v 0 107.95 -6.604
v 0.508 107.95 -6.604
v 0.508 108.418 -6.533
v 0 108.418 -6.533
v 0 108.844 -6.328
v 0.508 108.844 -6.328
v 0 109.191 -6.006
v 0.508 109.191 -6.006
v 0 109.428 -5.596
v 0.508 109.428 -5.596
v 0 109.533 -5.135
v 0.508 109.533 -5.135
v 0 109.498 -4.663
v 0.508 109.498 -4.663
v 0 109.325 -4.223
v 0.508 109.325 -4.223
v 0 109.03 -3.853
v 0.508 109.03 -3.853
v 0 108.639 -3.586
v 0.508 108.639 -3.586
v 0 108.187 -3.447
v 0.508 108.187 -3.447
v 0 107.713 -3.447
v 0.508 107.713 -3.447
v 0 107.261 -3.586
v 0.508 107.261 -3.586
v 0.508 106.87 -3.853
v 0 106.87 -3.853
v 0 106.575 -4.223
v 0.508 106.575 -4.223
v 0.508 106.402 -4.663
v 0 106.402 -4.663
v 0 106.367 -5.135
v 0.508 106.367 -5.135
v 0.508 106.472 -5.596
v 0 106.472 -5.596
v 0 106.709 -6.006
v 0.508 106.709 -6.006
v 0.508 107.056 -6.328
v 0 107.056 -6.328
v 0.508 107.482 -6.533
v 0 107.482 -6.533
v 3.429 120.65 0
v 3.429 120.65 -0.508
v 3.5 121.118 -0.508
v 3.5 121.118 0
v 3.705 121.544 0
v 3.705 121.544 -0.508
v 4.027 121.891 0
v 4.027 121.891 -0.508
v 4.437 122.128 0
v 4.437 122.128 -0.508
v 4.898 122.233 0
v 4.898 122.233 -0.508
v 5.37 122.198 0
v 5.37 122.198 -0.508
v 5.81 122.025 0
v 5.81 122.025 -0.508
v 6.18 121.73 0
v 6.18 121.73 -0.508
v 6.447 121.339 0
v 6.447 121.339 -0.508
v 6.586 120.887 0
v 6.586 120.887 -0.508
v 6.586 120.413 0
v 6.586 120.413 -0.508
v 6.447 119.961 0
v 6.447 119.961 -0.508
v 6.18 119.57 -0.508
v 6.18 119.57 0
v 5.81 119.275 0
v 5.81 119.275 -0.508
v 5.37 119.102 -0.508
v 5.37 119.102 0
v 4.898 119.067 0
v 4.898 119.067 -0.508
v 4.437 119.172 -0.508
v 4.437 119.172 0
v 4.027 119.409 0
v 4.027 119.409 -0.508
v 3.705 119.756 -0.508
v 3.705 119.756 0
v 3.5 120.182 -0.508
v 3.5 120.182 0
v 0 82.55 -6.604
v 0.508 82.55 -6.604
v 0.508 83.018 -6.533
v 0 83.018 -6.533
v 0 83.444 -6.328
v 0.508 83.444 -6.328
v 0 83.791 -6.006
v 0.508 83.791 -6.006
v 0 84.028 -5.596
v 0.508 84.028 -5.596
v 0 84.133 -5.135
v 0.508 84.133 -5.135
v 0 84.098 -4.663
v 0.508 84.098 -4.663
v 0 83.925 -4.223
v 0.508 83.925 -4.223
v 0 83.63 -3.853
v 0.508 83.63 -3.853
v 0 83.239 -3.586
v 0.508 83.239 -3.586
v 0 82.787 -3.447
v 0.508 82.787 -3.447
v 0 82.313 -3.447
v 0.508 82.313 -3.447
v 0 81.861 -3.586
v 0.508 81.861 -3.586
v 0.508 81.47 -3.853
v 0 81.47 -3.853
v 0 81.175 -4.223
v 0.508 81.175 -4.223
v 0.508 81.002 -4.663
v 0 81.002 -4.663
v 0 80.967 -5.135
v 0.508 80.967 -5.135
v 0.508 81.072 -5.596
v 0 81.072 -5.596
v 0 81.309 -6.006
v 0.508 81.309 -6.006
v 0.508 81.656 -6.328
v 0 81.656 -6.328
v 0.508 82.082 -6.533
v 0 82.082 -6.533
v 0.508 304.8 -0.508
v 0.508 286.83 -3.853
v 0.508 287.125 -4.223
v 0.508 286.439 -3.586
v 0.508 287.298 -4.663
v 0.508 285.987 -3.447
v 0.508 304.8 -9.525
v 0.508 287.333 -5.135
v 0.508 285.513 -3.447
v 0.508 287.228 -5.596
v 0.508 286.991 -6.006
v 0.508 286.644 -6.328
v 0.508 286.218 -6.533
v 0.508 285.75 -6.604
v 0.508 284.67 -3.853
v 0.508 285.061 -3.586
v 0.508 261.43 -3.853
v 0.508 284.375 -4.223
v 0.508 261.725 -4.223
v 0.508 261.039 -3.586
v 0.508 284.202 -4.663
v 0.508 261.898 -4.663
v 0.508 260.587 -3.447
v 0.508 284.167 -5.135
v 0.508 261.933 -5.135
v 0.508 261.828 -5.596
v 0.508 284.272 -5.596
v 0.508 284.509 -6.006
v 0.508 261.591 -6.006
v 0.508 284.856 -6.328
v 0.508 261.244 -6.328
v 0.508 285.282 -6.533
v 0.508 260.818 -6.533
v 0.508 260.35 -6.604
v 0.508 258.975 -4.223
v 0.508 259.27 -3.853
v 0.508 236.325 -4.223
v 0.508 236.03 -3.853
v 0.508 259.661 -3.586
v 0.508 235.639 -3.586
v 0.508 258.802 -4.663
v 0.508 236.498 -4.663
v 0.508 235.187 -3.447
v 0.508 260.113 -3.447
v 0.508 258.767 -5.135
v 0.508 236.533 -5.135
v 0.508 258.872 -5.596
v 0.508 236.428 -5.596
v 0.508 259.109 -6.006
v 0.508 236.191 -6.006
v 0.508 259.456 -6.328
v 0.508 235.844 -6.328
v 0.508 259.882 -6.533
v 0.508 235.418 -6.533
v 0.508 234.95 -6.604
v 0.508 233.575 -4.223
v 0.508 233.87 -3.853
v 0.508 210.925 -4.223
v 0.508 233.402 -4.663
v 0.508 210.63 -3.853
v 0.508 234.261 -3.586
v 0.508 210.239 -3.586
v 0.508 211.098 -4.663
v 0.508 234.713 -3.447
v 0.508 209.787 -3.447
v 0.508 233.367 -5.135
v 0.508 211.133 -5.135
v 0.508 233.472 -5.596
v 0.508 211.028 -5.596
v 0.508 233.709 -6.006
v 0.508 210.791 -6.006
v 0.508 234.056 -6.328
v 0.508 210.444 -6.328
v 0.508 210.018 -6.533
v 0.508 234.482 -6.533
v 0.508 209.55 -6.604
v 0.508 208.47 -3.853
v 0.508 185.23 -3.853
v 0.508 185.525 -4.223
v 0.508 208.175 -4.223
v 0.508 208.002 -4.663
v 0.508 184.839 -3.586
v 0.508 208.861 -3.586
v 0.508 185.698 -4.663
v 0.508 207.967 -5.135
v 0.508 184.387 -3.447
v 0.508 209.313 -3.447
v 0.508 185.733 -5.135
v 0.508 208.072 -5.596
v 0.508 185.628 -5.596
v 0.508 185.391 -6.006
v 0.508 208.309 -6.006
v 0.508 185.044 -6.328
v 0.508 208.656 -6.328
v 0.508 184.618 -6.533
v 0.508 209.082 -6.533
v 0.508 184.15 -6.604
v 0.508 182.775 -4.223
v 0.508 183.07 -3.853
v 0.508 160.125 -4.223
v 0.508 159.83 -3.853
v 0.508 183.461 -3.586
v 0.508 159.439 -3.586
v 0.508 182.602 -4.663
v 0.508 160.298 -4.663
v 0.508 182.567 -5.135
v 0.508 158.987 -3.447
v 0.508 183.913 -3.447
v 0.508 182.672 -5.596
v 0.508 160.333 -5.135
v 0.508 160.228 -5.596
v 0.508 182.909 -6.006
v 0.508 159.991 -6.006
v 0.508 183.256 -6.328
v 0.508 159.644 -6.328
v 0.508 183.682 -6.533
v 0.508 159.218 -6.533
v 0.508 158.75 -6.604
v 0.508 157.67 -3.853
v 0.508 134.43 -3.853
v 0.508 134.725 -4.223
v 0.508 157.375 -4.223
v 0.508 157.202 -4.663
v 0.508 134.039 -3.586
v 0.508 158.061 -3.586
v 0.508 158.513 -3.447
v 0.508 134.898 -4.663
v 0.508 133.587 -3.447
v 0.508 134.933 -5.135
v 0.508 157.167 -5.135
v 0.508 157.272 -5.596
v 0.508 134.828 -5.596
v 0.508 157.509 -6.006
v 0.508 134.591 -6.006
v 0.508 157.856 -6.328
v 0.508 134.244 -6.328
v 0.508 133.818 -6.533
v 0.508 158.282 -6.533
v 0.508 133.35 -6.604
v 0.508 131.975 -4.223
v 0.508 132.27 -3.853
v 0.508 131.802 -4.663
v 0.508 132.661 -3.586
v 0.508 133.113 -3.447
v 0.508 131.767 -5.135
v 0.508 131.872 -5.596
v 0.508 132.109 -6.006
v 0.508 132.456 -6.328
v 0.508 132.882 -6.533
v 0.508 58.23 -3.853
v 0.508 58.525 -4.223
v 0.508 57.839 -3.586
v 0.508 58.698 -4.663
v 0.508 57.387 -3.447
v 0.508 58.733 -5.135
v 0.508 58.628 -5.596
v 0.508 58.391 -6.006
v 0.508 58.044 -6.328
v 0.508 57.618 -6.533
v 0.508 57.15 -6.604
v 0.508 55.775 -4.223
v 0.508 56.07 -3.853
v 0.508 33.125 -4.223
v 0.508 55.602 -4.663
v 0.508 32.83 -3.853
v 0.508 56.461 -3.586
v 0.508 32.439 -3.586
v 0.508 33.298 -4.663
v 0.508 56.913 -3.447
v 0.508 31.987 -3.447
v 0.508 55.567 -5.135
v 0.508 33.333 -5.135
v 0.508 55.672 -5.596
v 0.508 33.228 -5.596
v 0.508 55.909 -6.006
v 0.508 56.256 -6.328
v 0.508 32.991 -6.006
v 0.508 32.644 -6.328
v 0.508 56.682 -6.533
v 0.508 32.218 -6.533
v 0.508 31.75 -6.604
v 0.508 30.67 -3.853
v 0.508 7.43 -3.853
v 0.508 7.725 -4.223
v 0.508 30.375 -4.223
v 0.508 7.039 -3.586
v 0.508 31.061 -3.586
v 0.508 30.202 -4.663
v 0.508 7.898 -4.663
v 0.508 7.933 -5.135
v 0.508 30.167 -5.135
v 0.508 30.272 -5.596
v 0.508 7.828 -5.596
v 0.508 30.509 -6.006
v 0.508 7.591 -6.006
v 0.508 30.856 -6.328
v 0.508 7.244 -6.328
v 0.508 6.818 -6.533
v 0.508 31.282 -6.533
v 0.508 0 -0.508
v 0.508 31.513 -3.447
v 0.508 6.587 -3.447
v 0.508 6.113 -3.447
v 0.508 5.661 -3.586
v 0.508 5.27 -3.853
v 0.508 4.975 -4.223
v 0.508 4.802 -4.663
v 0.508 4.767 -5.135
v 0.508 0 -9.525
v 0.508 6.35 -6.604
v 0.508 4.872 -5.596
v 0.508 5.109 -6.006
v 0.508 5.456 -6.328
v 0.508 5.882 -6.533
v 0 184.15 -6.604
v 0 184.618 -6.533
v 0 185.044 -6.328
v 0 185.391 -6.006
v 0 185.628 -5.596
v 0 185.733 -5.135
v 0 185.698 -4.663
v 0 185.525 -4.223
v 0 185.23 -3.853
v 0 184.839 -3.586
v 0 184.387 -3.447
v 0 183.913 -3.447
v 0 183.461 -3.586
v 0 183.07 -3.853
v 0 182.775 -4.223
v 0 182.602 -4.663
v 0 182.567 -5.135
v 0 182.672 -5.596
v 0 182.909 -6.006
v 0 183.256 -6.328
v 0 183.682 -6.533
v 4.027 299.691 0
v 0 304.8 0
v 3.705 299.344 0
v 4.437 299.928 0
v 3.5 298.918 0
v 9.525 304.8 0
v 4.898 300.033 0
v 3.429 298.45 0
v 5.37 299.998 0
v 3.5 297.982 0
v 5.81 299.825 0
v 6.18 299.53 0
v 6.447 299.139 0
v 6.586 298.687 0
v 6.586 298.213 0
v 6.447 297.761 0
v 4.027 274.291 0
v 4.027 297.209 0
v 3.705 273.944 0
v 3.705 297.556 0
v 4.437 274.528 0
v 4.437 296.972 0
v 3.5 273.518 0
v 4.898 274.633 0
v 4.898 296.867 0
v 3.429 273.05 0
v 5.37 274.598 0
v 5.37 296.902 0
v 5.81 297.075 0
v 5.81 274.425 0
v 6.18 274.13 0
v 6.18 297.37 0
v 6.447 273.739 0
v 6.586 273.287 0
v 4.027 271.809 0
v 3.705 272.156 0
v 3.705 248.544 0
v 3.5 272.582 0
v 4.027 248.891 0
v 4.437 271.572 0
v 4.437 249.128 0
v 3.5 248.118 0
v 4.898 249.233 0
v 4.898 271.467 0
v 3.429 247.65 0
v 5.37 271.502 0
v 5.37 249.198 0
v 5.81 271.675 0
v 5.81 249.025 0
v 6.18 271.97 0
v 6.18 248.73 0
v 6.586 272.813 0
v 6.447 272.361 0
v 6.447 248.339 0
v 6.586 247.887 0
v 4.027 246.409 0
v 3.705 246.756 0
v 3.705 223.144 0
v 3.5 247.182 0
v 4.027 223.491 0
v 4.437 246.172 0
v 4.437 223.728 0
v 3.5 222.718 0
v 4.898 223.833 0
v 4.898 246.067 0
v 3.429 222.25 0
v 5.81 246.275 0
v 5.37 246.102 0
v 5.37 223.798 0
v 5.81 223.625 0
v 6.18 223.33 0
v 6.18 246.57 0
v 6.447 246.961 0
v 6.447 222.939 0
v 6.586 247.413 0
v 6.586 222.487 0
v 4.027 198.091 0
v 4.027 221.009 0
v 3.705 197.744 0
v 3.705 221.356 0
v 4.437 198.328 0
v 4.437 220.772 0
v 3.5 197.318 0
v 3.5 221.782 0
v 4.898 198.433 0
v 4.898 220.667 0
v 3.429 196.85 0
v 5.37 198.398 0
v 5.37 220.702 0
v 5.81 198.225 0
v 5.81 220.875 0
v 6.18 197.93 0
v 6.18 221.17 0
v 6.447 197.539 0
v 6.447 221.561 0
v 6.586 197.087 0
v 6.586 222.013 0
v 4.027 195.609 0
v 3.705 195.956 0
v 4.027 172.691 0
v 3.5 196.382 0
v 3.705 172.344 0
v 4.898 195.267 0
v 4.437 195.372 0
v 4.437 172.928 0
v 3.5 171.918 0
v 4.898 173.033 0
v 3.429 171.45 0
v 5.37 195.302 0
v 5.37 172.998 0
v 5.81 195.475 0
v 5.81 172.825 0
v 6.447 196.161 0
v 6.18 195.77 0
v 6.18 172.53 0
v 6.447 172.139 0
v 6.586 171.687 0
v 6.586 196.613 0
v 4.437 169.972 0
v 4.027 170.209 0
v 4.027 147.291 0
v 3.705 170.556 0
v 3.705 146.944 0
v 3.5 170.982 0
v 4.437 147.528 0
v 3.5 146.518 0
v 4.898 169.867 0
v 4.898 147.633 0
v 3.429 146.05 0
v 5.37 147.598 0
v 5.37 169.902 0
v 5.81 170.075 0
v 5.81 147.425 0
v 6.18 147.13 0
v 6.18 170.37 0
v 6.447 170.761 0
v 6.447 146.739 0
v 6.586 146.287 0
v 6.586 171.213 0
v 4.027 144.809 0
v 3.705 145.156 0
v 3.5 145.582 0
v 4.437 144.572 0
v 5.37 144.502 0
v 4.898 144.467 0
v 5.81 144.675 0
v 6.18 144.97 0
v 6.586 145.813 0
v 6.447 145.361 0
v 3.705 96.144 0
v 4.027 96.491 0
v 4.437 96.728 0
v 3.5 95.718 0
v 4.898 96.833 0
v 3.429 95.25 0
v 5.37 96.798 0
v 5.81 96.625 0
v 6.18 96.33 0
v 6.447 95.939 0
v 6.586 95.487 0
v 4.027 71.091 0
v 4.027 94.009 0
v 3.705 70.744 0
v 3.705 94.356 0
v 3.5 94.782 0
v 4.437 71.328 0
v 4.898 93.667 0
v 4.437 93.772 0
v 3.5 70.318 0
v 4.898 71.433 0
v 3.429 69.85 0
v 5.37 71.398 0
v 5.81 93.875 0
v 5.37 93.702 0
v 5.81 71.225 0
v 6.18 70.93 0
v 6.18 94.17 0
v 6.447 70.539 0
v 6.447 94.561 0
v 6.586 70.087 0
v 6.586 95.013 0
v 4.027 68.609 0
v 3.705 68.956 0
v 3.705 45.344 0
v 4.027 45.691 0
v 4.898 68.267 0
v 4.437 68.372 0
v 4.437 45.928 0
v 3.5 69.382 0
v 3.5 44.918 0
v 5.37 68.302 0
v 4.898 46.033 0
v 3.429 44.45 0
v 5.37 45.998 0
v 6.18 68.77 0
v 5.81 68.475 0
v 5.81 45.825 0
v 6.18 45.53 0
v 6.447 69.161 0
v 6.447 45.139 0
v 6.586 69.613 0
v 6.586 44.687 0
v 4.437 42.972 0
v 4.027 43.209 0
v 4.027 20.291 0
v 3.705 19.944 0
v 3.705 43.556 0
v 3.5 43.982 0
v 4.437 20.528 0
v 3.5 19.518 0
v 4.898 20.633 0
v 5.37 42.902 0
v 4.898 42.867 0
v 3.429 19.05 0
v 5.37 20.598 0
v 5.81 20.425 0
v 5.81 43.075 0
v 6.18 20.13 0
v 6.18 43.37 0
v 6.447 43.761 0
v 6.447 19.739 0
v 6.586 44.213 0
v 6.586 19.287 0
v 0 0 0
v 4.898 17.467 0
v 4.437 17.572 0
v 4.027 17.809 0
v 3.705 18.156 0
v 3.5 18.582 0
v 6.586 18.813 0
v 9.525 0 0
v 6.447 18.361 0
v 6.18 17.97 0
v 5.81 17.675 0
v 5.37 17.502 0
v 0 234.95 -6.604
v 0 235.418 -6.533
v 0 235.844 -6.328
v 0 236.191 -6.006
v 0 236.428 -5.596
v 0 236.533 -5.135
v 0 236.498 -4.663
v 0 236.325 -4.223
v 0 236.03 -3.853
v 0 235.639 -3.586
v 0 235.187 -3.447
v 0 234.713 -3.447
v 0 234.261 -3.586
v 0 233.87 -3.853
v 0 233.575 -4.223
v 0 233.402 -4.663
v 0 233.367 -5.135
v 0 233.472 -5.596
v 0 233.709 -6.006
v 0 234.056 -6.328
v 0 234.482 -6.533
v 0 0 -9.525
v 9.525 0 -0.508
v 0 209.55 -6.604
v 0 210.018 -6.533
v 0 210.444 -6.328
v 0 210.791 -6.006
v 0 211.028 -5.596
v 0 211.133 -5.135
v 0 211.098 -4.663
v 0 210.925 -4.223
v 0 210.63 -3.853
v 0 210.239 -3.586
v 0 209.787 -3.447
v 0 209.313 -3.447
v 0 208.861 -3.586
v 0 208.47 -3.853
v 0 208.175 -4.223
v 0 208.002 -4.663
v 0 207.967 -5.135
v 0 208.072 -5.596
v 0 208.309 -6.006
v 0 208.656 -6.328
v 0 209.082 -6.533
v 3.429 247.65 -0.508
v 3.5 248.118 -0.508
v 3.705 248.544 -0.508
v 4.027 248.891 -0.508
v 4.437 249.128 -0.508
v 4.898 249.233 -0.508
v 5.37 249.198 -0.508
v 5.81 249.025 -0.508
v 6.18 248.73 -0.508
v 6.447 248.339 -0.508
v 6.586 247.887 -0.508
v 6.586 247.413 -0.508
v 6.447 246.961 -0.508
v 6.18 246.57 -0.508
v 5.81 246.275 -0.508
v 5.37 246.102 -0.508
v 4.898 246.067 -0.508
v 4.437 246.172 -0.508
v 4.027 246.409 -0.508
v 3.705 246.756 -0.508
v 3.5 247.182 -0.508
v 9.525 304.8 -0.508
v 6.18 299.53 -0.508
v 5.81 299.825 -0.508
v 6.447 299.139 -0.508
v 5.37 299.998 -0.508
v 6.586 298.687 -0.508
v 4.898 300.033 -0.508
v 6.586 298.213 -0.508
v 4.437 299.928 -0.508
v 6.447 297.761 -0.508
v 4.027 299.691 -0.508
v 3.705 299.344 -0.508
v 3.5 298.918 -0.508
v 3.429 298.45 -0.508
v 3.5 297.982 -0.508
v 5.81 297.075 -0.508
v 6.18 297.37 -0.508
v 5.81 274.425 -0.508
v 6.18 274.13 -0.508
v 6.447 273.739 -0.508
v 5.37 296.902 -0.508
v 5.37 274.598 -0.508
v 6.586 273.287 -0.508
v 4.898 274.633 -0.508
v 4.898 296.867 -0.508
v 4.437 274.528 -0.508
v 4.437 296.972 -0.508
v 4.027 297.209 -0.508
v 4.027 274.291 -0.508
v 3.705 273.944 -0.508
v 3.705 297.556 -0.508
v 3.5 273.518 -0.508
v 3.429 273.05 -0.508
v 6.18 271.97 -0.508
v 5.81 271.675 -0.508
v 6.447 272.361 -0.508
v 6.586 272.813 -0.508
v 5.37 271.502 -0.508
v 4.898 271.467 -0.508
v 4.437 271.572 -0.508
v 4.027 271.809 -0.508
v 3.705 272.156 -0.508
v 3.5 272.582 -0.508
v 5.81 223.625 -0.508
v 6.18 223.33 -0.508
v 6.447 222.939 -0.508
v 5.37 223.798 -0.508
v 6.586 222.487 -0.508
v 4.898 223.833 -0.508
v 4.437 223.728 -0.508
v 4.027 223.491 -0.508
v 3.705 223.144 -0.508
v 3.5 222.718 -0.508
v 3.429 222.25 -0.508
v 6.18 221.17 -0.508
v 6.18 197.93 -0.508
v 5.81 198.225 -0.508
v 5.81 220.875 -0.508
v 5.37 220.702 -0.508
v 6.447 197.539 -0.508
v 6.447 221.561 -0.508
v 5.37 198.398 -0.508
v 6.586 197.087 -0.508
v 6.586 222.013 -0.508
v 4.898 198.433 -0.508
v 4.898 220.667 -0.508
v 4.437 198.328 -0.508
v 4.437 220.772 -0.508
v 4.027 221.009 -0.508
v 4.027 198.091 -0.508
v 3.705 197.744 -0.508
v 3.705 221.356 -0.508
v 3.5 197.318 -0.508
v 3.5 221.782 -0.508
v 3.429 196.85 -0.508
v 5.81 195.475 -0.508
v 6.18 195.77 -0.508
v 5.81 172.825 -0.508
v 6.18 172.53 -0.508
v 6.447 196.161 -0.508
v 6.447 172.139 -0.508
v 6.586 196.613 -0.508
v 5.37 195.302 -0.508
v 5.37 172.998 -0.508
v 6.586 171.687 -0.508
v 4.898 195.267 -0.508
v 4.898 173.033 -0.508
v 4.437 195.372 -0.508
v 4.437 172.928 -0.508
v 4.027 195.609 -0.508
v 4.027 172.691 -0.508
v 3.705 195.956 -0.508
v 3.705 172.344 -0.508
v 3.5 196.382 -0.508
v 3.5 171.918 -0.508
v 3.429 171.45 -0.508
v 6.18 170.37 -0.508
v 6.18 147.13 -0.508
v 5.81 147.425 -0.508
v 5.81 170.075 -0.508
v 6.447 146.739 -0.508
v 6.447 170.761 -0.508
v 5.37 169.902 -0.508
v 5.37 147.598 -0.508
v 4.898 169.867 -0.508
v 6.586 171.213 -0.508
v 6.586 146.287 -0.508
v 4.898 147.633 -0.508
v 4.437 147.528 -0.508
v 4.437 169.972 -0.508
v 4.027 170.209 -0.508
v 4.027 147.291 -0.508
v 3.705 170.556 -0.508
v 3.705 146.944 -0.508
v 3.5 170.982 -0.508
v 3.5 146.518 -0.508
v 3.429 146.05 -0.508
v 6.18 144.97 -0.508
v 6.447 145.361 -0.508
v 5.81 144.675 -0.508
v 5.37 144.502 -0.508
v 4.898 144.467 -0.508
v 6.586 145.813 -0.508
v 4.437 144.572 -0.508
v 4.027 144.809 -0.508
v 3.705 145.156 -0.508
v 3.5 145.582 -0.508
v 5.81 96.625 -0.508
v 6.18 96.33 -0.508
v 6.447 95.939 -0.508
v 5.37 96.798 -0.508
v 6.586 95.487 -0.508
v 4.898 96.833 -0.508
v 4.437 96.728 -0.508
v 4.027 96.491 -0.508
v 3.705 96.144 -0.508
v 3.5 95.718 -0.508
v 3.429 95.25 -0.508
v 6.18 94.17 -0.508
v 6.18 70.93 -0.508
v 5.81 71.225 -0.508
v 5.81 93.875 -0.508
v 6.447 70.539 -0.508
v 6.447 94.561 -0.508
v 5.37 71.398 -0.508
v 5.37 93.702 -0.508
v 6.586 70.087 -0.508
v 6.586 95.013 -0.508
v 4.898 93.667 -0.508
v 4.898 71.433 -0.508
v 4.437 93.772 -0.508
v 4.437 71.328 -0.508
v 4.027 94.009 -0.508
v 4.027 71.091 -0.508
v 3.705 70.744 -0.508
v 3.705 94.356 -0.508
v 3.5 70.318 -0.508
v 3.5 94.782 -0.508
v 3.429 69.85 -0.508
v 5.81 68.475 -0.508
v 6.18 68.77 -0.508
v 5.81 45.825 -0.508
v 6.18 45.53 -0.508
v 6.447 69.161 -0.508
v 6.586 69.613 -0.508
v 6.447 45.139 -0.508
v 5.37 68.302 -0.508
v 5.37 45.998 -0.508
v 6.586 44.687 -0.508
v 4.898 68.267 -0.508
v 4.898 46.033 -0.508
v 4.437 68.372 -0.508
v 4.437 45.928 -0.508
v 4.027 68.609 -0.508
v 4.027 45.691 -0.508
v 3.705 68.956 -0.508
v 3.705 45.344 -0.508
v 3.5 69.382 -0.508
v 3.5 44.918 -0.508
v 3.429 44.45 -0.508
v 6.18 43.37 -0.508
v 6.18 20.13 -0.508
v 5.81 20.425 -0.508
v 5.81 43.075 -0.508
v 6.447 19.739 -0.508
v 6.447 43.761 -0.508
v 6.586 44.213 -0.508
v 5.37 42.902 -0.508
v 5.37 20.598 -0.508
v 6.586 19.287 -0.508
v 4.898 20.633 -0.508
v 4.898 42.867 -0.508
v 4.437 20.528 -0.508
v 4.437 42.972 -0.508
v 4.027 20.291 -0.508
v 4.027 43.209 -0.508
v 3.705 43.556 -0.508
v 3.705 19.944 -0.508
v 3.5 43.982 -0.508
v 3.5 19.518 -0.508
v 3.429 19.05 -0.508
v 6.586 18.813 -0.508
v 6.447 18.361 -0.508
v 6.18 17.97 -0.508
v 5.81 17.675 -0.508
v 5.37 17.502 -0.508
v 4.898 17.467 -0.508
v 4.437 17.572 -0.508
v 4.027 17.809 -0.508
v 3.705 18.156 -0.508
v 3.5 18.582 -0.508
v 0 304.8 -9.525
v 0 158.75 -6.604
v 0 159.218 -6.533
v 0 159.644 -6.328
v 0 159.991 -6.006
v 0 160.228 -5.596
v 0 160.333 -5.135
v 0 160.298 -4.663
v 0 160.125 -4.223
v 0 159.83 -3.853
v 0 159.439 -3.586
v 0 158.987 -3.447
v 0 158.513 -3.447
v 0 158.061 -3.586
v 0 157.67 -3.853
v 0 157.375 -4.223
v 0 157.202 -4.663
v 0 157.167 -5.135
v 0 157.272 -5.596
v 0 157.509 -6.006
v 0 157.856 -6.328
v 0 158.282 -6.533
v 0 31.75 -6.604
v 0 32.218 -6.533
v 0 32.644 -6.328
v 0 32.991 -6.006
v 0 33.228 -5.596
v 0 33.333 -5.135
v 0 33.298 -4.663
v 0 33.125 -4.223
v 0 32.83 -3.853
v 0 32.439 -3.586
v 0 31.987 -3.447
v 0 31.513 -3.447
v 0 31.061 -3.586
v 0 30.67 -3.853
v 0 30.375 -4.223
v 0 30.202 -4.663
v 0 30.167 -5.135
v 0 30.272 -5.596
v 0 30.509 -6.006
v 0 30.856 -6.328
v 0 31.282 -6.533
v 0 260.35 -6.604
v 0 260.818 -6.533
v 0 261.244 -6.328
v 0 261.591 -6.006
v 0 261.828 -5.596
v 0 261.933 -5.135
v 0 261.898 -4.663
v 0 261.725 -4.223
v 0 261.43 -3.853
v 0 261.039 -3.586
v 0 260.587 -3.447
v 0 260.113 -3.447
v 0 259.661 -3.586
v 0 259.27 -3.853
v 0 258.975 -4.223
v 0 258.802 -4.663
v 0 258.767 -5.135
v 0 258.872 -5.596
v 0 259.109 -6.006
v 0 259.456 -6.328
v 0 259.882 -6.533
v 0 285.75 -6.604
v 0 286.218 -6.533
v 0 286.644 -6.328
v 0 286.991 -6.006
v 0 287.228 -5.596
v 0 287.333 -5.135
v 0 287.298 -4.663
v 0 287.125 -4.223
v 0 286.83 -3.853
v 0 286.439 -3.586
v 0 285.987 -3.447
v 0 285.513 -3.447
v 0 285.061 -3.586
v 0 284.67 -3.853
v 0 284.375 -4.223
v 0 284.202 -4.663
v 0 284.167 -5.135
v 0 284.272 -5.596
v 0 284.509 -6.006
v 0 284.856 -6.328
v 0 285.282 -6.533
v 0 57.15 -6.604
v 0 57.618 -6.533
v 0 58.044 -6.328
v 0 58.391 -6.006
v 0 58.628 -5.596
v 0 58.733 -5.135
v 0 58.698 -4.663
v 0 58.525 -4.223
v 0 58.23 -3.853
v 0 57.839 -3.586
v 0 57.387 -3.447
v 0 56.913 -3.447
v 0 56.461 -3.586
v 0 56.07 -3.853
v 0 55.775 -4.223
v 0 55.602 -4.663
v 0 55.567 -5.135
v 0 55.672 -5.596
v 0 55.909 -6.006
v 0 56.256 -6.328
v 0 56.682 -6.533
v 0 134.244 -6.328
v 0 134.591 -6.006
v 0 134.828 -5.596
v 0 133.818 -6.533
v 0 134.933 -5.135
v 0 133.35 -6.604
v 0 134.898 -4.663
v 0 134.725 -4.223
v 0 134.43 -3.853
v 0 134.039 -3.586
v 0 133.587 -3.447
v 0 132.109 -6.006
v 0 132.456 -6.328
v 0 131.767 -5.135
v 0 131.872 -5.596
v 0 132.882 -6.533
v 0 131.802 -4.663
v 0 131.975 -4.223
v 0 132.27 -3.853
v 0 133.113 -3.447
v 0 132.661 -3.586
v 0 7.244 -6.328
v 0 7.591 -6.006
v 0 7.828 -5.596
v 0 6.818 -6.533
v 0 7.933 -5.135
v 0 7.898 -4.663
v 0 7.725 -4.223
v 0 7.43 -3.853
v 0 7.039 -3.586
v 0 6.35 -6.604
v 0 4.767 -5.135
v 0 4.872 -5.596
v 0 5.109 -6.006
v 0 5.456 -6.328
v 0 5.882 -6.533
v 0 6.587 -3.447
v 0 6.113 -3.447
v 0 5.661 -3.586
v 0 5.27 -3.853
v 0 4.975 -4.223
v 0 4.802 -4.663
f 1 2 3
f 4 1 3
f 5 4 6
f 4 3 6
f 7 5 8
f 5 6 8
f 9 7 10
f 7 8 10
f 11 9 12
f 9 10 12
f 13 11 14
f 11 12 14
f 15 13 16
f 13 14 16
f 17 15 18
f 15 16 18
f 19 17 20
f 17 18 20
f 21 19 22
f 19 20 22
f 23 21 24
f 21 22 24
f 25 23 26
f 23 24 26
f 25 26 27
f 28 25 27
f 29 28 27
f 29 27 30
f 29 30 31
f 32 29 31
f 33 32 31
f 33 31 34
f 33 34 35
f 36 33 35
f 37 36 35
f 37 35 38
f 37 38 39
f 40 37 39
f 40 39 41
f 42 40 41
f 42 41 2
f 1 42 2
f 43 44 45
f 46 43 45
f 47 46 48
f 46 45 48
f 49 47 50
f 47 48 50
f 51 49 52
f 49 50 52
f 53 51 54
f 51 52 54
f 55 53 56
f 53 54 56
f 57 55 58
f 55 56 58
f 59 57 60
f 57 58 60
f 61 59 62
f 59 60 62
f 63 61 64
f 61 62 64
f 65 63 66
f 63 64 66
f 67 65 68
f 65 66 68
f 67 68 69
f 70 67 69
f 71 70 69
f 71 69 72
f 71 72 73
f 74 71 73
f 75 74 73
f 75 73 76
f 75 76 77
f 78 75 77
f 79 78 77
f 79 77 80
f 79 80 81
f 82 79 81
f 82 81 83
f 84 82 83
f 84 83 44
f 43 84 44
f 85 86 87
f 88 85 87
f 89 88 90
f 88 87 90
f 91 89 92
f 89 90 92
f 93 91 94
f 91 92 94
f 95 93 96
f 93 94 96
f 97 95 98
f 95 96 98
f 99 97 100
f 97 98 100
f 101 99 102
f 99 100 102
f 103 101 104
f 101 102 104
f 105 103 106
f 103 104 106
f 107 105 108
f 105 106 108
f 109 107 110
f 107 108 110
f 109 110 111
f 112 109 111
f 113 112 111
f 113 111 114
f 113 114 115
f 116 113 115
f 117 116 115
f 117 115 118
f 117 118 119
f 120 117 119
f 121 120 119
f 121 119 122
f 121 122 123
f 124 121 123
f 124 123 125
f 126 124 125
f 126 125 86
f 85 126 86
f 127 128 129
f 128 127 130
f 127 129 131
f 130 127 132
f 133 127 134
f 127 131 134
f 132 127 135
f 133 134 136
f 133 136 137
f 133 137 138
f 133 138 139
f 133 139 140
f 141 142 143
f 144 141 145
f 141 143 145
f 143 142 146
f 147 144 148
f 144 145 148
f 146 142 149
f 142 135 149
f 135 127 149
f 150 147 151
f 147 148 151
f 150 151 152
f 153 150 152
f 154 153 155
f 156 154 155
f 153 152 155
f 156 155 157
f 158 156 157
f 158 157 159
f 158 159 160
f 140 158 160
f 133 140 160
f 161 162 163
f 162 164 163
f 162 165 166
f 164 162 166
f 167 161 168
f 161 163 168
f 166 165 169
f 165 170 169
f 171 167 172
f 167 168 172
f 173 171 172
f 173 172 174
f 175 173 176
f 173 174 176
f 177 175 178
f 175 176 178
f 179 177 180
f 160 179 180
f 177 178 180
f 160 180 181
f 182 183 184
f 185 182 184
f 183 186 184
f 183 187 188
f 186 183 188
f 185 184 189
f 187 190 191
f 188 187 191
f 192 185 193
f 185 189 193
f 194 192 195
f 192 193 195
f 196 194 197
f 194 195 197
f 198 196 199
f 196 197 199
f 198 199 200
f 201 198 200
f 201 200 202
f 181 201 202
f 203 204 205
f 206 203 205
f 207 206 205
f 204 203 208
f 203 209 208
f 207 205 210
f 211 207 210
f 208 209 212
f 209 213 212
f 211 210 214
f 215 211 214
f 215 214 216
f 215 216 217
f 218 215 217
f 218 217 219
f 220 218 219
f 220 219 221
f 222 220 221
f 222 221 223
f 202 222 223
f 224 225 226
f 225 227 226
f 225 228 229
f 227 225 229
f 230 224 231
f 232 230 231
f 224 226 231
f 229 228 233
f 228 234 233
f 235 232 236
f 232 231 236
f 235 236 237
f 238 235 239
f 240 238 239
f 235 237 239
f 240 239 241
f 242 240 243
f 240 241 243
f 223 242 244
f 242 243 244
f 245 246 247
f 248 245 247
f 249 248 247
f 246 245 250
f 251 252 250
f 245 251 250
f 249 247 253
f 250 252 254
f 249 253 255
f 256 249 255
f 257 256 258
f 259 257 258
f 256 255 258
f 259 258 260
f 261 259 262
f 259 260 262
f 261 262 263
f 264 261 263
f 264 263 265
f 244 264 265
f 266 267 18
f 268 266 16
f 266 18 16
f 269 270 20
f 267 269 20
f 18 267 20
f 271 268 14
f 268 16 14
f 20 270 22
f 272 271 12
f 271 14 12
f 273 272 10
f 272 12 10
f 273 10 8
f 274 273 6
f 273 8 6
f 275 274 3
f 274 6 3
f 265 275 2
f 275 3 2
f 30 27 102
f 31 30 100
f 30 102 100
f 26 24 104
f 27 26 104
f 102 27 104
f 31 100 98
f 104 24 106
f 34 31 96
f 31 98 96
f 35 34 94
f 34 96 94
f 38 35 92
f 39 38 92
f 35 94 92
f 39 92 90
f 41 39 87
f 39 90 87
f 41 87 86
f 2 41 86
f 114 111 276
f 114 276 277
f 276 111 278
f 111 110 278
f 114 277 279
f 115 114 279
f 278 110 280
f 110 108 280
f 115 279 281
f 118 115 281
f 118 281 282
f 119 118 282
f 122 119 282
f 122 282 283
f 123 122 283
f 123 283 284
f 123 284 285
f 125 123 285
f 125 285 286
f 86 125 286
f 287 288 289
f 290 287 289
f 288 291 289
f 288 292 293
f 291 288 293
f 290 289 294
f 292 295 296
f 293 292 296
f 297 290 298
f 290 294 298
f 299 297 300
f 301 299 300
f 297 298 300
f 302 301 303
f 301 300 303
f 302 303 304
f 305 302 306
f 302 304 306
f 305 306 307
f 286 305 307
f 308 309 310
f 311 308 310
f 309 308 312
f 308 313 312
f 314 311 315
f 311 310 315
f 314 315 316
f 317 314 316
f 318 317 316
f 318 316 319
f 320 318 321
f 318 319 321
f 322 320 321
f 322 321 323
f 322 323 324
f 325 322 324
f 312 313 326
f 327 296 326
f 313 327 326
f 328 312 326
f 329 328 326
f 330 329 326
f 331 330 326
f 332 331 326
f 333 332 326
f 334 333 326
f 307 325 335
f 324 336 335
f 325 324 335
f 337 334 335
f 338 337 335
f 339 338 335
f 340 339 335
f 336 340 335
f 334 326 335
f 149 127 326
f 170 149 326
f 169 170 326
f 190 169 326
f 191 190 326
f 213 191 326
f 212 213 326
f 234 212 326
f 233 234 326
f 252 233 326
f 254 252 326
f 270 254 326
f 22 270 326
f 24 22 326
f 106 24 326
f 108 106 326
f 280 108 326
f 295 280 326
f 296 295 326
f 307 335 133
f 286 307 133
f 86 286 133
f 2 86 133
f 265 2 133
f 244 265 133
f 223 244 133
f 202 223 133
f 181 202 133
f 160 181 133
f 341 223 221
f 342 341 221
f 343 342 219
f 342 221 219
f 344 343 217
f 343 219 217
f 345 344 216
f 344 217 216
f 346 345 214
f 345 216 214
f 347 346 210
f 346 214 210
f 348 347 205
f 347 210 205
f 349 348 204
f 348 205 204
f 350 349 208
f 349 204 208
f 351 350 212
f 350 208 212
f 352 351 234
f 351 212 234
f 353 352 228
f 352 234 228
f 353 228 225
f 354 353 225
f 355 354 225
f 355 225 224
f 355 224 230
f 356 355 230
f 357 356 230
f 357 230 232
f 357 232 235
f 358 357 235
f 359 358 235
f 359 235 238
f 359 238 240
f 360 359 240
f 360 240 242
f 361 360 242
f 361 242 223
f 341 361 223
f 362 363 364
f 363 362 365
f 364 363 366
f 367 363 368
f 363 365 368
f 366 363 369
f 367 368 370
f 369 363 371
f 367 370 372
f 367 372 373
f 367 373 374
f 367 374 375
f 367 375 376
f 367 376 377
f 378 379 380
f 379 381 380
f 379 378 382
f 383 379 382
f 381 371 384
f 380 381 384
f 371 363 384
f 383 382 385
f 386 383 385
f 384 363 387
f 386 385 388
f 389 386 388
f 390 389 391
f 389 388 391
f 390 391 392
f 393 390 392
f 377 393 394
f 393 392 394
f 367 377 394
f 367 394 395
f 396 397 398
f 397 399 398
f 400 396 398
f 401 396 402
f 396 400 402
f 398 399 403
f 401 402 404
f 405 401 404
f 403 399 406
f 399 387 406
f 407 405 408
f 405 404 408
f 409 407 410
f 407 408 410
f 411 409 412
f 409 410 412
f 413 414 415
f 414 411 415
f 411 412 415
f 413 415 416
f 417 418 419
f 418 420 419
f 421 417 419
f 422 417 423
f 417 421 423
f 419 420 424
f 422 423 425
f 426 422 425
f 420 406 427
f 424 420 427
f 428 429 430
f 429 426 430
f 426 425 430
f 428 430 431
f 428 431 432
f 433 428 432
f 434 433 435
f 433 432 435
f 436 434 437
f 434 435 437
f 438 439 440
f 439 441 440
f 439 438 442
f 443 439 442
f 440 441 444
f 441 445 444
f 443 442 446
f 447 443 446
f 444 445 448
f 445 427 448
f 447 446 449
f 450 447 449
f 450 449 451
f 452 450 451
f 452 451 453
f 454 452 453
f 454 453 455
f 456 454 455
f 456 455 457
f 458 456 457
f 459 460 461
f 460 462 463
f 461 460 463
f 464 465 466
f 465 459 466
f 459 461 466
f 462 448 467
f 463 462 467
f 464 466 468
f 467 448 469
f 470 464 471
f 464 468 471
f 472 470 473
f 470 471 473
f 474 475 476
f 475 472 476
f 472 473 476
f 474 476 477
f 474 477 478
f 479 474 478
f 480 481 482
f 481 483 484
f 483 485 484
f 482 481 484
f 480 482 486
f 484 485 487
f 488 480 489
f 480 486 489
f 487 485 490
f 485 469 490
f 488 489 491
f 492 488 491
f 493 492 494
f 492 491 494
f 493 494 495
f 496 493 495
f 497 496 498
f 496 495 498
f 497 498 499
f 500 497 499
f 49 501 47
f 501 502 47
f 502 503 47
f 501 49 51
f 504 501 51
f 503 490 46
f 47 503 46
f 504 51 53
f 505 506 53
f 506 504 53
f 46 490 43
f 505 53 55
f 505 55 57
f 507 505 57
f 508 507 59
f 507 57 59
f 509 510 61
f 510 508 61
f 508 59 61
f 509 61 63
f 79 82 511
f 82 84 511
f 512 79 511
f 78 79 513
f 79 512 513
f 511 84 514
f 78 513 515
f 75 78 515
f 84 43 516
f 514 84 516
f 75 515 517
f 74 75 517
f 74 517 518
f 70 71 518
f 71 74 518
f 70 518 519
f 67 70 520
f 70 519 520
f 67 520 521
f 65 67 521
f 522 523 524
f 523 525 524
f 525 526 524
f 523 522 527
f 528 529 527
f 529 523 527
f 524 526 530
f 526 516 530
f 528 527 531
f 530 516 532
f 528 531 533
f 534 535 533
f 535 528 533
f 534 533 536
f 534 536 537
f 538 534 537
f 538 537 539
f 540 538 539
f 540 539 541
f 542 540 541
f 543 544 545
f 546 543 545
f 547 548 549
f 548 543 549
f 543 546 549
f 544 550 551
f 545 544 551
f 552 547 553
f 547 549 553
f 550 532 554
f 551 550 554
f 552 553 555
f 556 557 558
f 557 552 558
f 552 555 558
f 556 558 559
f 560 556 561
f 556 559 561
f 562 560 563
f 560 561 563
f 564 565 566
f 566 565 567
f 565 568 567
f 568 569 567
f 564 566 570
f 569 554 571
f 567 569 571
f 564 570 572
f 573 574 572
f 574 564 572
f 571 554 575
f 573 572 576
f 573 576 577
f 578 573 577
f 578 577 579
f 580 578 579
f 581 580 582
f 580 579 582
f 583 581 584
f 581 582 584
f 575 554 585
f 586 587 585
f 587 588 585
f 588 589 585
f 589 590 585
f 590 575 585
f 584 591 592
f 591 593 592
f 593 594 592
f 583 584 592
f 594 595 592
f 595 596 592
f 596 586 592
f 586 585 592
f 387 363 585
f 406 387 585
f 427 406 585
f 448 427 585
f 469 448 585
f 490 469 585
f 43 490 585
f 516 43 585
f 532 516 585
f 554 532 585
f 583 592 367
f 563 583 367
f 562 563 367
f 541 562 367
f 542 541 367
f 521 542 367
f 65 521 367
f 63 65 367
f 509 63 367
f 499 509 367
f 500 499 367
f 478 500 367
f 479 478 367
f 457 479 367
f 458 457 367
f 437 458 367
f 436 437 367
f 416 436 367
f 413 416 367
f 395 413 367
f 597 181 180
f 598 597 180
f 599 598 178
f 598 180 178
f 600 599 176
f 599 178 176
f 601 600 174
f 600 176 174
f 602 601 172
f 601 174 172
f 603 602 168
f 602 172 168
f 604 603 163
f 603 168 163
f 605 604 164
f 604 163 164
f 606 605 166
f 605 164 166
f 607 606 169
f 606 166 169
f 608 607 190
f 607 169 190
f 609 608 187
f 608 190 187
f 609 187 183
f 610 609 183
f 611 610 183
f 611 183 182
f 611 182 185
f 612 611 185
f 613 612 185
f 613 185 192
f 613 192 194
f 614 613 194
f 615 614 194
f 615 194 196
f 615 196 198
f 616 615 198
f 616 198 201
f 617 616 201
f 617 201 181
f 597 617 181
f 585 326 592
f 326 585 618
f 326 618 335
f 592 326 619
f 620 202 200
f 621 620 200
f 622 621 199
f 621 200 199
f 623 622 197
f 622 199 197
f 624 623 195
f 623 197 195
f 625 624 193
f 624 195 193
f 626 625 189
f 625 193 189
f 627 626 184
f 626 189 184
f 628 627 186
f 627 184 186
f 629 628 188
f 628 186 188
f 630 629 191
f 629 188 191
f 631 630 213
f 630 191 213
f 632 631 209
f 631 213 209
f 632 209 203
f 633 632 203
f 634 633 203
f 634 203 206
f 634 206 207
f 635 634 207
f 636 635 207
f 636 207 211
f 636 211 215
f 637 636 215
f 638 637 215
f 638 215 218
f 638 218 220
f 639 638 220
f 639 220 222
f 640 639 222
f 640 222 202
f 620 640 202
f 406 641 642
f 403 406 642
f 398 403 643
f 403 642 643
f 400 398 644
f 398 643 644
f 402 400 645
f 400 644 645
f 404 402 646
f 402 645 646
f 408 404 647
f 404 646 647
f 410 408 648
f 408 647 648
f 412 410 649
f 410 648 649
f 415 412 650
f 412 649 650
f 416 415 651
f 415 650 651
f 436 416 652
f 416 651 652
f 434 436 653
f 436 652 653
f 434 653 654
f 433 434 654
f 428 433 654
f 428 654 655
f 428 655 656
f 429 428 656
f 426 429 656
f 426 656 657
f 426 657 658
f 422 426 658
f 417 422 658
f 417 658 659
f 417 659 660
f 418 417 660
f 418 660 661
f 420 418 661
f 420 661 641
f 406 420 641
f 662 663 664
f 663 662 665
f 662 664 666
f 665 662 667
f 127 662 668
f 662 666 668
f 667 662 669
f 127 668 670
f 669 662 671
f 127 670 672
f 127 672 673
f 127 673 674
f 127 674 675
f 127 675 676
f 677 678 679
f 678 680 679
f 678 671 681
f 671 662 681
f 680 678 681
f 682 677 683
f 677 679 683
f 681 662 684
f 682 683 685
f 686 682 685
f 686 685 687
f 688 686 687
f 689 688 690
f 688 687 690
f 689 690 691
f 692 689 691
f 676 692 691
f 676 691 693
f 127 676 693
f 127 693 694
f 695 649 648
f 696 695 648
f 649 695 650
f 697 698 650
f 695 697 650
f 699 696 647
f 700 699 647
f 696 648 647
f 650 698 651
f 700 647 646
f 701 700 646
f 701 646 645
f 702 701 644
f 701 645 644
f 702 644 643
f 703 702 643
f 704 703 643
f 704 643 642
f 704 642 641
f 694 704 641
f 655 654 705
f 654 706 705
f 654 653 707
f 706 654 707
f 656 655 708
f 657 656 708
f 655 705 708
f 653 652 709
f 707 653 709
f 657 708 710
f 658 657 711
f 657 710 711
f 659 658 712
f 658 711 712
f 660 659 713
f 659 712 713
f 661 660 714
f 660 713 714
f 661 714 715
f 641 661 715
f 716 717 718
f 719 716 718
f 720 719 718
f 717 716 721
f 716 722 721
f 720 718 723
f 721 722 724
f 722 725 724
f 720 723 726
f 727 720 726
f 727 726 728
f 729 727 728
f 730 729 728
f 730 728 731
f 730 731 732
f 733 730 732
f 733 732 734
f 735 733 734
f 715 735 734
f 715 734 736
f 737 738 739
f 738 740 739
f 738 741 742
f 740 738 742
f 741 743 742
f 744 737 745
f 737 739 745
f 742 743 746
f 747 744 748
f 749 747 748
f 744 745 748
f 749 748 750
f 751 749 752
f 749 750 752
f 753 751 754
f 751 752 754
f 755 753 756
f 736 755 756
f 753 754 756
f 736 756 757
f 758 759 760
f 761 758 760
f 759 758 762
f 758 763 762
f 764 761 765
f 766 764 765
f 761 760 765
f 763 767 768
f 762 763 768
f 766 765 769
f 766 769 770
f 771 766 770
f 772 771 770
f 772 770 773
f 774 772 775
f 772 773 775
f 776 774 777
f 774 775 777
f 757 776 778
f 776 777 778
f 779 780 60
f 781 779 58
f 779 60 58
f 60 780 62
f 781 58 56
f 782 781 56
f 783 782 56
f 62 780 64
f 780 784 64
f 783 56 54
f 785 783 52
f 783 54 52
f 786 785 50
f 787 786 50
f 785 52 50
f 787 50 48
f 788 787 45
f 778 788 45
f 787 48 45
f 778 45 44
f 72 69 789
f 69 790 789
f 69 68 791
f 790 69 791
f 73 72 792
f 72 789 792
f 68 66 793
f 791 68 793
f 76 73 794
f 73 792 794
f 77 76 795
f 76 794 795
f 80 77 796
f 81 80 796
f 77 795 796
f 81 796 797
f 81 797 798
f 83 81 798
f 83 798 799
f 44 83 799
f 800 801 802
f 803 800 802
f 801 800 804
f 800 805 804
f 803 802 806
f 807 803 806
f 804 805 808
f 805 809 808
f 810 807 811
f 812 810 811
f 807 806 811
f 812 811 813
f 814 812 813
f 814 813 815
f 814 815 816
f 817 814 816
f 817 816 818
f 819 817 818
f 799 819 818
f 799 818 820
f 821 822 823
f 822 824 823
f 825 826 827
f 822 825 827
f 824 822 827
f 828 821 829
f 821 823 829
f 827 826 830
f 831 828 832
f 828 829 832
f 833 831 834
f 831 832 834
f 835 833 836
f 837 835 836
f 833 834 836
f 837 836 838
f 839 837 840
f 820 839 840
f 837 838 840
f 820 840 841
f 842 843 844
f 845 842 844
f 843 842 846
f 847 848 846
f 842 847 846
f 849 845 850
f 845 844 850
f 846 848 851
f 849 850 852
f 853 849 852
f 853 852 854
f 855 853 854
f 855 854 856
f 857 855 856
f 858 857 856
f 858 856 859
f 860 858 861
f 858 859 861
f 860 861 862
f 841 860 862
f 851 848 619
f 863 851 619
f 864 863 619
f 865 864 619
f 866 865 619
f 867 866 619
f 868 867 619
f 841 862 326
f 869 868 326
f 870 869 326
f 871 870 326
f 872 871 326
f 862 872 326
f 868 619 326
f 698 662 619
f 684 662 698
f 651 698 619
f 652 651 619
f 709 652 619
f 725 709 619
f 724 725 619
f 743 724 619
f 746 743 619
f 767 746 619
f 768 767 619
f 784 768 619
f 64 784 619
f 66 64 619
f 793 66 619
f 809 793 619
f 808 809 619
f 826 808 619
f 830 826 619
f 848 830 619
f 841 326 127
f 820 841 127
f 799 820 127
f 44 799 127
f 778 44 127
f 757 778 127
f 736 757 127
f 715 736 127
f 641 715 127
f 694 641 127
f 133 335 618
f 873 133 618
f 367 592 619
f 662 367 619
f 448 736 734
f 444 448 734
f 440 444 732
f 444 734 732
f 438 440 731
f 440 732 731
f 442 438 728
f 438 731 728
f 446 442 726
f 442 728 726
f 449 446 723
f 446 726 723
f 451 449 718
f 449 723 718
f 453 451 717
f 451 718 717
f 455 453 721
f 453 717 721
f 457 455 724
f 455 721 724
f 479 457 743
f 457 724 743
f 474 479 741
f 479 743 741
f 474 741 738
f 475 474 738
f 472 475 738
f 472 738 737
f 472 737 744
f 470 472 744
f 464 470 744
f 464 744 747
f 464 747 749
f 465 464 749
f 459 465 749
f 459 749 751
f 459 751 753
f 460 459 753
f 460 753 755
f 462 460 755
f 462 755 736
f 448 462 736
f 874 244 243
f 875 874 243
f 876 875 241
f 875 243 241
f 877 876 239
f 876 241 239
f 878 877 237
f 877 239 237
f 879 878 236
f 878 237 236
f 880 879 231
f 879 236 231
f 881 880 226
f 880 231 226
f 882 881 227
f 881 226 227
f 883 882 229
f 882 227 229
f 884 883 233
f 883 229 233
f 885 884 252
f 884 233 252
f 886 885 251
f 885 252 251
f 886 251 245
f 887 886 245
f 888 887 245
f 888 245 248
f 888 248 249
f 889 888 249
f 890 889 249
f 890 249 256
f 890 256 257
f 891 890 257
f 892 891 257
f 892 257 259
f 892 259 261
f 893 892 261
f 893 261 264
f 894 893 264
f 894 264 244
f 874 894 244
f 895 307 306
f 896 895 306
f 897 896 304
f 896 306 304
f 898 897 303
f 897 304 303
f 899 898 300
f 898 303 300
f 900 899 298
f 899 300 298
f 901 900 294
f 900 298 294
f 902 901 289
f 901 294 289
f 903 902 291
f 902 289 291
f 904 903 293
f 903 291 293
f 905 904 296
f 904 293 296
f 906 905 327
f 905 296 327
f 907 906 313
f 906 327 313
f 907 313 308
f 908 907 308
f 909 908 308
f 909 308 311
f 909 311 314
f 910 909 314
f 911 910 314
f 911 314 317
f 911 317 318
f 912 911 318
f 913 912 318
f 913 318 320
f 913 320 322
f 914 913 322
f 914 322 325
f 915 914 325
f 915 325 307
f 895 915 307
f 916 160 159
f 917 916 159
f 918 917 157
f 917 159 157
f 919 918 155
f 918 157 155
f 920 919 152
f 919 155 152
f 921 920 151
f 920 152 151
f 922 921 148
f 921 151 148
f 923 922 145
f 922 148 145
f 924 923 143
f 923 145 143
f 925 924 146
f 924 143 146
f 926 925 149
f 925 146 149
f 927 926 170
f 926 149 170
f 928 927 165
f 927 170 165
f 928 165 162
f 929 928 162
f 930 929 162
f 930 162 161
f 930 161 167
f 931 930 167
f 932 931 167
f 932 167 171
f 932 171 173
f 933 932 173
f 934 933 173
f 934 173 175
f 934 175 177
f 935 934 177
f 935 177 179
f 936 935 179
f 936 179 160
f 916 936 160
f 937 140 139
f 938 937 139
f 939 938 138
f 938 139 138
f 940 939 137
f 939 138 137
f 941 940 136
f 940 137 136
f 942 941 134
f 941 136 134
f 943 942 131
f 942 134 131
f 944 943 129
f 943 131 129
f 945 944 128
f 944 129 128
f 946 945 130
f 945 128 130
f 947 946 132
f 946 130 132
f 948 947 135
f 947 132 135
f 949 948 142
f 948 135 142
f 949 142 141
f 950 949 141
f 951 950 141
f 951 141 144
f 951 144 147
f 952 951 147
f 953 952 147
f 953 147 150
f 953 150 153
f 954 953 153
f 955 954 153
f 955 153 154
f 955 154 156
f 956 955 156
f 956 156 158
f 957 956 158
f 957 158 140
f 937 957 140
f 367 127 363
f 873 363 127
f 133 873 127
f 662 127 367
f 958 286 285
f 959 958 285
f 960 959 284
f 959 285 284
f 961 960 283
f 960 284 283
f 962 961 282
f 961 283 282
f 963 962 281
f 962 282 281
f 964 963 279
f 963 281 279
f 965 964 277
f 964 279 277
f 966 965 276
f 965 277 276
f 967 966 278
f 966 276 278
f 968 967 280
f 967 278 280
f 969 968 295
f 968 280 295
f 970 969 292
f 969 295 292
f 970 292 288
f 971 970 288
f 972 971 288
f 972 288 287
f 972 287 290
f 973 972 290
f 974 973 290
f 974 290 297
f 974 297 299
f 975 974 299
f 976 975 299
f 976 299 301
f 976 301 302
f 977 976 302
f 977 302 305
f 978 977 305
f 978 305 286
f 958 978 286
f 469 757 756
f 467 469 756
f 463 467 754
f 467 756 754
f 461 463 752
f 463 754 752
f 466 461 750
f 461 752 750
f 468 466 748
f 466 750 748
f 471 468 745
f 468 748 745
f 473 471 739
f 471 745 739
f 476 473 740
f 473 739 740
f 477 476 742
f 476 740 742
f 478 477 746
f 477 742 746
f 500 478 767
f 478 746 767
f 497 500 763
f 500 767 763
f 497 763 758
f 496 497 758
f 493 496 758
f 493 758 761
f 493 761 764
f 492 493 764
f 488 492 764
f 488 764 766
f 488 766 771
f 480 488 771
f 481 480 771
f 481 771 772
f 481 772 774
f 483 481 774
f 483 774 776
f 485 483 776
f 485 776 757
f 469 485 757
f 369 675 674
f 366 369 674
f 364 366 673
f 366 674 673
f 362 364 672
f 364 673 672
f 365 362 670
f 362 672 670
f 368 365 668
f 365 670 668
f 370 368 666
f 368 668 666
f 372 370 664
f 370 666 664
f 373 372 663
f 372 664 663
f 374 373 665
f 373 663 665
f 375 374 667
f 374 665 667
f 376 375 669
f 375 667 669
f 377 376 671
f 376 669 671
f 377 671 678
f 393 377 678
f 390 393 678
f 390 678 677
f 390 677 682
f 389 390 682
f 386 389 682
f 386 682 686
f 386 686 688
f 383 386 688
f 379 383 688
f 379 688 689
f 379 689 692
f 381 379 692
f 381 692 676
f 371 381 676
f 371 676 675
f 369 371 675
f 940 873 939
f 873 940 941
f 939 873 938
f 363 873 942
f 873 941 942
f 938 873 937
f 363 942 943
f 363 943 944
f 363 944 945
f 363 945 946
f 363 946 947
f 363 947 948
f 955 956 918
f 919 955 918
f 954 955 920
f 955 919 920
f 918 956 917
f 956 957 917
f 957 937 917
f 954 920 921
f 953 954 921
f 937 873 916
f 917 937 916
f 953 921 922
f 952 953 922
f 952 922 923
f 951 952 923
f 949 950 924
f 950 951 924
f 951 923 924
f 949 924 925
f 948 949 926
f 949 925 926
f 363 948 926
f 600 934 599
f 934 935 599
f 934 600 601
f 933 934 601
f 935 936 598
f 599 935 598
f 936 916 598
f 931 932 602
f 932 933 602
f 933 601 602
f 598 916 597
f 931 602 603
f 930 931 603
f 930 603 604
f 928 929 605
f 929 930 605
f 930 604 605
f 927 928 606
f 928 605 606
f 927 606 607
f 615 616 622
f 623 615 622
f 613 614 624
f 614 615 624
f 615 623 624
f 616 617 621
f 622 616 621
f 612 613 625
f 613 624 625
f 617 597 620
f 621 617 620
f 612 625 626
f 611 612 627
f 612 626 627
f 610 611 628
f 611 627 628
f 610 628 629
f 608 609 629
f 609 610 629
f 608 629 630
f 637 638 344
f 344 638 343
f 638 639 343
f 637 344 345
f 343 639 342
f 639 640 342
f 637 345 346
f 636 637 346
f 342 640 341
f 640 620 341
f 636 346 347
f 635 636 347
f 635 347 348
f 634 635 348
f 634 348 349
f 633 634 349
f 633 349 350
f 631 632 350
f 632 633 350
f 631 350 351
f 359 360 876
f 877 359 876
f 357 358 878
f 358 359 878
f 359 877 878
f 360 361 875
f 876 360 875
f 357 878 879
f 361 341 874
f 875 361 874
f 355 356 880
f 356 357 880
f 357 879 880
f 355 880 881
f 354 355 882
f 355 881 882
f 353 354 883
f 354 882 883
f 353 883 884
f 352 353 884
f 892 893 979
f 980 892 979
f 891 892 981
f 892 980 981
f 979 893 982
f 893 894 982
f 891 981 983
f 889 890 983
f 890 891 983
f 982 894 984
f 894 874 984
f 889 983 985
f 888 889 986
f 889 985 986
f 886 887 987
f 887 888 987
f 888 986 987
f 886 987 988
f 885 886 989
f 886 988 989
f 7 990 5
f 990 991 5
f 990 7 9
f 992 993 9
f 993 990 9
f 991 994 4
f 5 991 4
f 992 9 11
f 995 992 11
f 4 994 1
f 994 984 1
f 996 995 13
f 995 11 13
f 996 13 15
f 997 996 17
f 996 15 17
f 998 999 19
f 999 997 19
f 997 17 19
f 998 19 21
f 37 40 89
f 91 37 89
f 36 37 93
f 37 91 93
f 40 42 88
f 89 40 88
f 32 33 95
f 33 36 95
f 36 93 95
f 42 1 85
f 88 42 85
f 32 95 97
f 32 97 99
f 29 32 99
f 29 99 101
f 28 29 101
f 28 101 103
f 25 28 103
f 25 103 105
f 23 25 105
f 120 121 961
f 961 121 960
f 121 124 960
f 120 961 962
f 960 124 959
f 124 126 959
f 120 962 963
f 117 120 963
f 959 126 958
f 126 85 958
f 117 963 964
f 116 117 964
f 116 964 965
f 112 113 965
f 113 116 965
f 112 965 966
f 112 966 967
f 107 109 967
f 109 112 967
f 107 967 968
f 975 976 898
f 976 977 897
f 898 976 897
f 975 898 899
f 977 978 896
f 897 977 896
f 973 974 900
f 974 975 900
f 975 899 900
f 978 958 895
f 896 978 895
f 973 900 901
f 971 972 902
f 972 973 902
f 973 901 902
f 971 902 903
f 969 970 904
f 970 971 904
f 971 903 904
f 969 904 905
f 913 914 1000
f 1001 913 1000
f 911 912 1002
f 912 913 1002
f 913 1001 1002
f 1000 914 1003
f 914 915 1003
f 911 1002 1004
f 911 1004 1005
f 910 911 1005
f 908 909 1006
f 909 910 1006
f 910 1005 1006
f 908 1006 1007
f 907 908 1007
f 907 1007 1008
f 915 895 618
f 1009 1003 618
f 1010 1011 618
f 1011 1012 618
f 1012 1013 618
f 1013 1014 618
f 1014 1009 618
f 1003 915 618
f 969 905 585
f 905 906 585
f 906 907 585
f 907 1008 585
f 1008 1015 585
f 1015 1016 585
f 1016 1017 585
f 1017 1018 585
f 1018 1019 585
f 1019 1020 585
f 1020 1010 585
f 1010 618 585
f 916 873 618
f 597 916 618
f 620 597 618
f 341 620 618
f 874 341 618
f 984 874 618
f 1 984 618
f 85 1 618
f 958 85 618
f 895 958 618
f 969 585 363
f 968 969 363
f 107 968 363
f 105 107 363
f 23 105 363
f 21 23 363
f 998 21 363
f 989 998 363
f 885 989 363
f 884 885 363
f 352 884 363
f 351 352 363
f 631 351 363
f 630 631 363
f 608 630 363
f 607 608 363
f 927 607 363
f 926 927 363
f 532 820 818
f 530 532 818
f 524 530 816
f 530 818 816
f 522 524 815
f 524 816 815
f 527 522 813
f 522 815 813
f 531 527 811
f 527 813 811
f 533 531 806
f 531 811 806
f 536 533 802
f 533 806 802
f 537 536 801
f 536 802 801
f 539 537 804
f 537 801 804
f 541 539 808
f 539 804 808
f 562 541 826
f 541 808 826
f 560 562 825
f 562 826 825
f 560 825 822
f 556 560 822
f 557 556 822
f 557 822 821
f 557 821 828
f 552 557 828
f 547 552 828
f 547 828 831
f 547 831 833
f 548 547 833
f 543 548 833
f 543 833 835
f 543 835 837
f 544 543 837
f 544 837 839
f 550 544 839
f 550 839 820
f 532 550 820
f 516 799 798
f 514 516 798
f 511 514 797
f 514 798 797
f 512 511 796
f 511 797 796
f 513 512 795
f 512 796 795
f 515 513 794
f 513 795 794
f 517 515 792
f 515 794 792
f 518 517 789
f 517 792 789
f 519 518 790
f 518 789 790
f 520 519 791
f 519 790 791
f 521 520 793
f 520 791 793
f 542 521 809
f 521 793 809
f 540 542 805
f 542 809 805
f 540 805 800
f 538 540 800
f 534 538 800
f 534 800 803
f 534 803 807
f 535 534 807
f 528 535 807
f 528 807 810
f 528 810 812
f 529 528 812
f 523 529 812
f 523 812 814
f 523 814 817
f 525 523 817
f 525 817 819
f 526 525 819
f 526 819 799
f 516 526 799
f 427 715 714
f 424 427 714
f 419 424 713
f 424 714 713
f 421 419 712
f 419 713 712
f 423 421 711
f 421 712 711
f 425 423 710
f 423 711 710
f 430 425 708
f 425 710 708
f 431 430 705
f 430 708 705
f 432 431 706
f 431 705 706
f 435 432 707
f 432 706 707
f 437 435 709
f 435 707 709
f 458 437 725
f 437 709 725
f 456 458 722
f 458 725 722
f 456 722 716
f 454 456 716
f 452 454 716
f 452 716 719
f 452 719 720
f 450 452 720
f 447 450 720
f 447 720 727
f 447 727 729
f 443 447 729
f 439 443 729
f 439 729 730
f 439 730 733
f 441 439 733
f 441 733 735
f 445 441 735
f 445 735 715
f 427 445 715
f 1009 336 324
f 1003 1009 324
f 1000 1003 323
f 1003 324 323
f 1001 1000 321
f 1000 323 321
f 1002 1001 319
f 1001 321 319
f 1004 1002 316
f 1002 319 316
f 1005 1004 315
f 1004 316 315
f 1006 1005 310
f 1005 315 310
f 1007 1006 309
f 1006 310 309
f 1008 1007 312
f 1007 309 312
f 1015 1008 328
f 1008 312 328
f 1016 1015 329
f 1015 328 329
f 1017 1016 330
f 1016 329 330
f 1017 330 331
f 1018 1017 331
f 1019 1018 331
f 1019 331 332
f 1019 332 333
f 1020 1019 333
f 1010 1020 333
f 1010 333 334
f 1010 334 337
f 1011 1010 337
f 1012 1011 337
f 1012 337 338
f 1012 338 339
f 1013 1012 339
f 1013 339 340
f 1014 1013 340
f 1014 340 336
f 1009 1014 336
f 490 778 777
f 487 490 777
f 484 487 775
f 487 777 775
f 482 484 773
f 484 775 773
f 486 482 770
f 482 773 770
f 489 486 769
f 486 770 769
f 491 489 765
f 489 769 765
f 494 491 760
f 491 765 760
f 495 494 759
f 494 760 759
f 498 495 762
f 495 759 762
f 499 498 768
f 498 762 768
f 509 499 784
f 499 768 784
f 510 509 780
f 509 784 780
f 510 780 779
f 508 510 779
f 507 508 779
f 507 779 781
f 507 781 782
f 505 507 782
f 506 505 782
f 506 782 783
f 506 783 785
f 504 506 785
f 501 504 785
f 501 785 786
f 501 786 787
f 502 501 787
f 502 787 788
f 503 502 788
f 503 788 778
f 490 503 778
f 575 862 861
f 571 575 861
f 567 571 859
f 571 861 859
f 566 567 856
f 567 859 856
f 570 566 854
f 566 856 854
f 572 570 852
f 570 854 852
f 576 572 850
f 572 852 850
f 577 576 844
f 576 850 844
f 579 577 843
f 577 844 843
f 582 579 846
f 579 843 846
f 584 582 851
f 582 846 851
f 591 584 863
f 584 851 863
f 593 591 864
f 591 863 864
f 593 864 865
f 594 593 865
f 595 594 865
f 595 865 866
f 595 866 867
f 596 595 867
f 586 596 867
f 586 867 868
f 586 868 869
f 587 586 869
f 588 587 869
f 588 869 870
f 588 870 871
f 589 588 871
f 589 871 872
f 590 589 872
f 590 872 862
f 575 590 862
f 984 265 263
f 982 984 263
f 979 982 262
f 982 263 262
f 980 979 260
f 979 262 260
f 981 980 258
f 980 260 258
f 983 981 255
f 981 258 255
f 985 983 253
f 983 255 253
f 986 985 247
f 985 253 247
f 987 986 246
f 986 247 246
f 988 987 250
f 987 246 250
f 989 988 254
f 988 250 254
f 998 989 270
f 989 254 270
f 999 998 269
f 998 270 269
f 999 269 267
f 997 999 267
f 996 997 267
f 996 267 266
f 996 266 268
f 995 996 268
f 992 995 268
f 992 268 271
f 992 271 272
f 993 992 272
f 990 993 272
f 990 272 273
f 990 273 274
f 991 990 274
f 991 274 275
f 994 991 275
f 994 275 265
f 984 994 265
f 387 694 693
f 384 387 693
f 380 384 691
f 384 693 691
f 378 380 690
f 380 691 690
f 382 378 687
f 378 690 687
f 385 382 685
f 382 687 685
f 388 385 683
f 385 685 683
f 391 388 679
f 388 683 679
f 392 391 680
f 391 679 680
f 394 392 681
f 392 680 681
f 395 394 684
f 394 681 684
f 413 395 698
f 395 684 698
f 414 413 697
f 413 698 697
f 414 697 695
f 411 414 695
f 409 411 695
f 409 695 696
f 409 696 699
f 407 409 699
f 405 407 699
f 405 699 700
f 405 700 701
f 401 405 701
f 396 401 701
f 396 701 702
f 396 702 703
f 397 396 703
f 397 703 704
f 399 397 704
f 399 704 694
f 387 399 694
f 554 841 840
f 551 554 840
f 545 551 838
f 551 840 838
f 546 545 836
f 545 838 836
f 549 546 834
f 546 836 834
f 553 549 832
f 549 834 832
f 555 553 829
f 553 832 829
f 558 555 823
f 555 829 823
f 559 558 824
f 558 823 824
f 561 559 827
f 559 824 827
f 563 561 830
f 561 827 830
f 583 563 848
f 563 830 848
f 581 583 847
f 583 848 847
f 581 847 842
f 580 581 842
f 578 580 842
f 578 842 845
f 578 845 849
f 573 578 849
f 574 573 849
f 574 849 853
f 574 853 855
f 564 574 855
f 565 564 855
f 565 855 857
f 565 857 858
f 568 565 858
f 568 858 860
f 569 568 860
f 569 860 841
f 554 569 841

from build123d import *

# Parameters (mm, degrees)
BOSS_EXTRUDE1_DEPTH = 304.8
SKETCH3_R           = 1.5875
CUT_EXTRUDE1_DEPTH  = 306.082074062
LPATTERN1_COUNT     = 12
LPATTERN1_PITCH     = 25.4
SKETCH4_R           = 1.5875
CUT_EXTRUDE2_DEPTH  = 306.082074062
LPATTERN2_COUNT     = 12
LPATTERN2_PITCH     = 25.4


with BuildPart() as part:
    # Sketch2 → Boss-Extrude1 (new body)
    with BuildSketch(Plane(origin=(0, 0, 0), x_dir=(1, 0, 0), z_dir=(0, 1, 0))):
        Polygon((0, 0), (9.525, 0), (9.525, 0.508), (0.508, 0.508), (0.508, 9.525), (0, 9.525), align=None)
    extrude(amount=BOSS_EXTRUDE1_DEPTH)

    # Sketch3 → Cut-Extrude1 (cut, through all)
    with BuildSketch(Plane(origin=(0, 0, -0.508), x_dir=(-1, 0, 0), z_dir=(0, 0, -1))):
        with Locations((-5.0165, 298.45)):
            Circle(SKETCH3_R)
    cut_extrude1 = extrude(amount=-CUT_EXTRUDE1_DEPTH, mode=Mode.SUBTRACT)

    # LPattern1: Cut-Extrude1 ×12
    with Locations(*[(0, -i * LPATTERN1_PITCH, 0) for i in range(1, LPATTERN1_COUNT)]):
        add(cut_extrude1, mode=Mode.SUBTRACT)

    # Sketch4 → Cut-Extrude2 (cut, through all)
    with BuildSketch(Plane(origin=(0.508, 0, 0), x_dir=(0, 0, -1), z_dir=(1, 0, 0))):
        with Locations((5.0165, 285.75)):
            Circle(SKETCH4_R)
    cut_extrude2 = extrude(amount=-CUT_EXTRUDE2_DEPTH, mode=Mode.SUBTRACT)

    # LPattern2: Cut-Extrude2 ×12
    with Locations(*[(0, -i * LPATTERN2_PITCH, 0) for i in range(1, LPATTERN2_COUNT)]):
        add(cut_extrude2, mode=Mode.SUBTRACT)


solid = part.part
